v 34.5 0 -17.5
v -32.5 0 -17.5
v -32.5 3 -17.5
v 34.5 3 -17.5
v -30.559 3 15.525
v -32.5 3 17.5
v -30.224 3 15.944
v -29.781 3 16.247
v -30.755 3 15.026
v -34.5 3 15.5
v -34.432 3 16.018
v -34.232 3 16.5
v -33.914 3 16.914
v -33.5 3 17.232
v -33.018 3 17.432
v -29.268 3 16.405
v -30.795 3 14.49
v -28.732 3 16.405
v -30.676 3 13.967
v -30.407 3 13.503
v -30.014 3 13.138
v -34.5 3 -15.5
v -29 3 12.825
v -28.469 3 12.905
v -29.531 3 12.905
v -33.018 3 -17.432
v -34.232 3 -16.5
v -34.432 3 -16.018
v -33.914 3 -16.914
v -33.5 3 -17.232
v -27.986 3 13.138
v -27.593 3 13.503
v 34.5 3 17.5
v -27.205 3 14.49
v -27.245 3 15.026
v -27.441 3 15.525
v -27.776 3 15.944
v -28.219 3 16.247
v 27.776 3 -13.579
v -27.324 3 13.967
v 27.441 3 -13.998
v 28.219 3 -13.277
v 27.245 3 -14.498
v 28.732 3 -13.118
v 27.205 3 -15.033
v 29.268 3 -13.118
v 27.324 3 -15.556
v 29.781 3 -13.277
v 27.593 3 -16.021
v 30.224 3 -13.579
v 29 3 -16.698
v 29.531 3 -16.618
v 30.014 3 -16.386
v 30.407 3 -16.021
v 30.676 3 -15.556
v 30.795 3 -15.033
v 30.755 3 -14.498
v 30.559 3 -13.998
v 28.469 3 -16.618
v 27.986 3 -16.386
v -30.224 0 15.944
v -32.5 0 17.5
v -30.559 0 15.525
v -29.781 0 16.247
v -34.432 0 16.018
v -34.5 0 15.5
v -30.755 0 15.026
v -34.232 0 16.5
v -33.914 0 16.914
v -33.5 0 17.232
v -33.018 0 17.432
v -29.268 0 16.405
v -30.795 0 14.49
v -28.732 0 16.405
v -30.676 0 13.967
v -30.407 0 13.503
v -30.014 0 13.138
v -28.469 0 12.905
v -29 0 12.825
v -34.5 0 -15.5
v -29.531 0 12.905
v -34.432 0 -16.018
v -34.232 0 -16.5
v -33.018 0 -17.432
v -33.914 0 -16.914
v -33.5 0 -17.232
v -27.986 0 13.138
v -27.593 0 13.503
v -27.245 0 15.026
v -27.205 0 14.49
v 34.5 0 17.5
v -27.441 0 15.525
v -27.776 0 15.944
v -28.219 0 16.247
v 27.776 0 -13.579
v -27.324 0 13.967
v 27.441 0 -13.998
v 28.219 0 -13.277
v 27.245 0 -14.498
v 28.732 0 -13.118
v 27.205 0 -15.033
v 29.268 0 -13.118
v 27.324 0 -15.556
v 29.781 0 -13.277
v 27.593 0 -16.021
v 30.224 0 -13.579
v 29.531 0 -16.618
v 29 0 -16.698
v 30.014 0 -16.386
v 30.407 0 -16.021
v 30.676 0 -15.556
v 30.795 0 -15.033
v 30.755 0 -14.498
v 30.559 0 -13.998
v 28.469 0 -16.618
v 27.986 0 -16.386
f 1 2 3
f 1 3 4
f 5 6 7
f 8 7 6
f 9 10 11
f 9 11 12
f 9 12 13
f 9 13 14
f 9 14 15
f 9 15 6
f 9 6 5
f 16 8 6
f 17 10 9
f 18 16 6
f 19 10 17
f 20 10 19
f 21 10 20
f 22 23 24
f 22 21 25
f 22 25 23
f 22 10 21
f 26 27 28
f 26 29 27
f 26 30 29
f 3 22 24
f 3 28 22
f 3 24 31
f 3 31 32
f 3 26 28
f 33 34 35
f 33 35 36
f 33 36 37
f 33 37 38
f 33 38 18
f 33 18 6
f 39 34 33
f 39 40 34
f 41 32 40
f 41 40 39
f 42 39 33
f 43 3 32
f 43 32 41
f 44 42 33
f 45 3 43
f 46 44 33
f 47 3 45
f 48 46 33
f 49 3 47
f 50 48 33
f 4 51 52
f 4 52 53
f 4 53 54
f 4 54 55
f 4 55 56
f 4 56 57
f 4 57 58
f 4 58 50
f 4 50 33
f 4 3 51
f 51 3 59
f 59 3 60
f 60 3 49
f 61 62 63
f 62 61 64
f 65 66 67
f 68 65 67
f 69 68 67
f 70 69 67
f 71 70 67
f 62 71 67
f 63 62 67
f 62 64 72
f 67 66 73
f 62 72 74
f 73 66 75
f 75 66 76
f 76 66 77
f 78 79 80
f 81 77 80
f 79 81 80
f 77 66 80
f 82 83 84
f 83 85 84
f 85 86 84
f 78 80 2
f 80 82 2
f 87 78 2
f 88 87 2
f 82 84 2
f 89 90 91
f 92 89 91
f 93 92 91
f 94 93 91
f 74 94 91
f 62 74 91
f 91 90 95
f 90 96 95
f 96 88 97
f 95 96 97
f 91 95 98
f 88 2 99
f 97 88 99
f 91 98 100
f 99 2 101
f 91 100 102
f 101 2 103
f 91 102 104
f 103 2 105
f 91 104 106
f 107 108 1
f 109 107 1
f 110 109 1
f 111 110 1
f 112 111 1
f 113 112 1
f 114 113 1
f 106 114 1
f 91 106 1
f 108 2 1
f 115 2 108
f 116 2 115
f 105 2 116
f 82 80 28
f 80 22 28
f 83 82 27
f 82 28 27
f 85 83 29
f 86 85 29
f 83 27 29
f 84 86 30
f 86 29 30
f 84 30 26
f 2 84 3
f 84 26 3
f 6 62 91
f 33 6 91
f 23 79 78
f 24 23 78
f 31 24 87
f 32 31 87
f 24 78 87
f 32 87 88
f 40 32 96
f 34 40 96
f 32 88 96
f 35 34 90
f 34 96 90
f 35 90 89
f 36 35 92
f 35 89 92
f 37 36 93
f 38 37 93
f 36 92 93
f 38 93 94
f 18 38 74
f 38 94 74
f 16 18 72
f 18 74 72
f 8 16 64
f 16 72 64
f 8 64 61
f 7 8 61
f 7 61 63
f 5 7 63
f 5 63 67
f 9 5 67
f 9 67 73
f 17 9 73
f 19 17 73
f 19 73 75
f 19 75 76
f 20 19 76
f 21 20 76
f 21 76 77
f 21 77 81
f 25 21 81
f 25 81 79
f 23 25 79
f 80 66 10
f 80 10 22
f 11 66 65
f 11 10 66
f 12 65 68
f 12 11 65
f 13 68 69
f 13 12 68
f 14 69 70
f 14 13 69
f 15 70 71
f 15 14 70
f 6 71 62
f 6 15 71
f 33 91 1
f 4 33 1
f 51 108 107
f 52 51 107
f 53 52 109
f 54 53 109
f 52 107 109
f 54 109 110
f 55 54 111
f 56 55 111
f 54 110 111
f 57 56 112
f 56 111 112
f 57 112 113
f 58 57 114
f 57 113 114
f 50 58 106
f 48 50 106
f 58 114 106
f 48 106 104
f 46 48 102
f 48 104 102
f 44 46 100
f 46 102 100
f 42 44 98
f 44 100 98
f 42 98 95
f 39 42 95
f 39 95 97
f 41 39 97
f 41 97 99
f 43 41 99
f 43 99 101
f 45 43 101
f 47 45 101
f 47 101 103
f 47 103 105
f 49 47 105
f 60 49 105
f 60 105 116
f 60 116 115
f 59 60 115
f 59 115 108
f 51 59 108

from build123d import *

# Parameters (mm, degrees)
SKETCH1_W           = 69
SKETCH1_H           = 35
BOSS_EXTRUDE1_DEPTH = 3
FILLET4_R           = 2
CUT_EXTRUDE1_REACH  = 40.801
SKETCH2_R           = 1.8


with BuildPart() as part:
    # Sketch1 → Boss-Extrude1 (new body)
    with BuildSketch(Plane(origin=(0, 0, 0), x_dir=(1, 0, 0), z_dir=(0, 1, 0))):
        Rectangle(SKETCH1_W, SKETCH1_H)
    extrude(amount=BOSS_EXTRUDE1_DEPTH)

    # Fillet4
    fillet4_edges = [part.edges().sort_by_distance(p)[0] for p in [
        (-34.5, 1.5, 17.5),
        (-34.5, 1.5, -17.5),
    ]]
    fillet(fillet4_edges, radius=FILLET4_R)

    # Sketch2 → Cut-Extrude1 (cut, up to next)
    with BuildSketch(Plane.XZ, mode=Mode.PRIVATE) as cut_extrude1_sk1:
        with Locations(Location((-29, 14.625, 0), (0, 0, 270))):
            Circle(SKETCH2_R)
    cut_extrude1_tool1 = extrude(cut_extrude1_sk1.sketch, amount=-CUT_EXTRUDE1_REACH, mode=Mode.PRIVATE) & part.part
    # Sketch2 → Cut-Extrude1 (cut, up to next)
    with BuildSketch(Plane.XZ, mode=Mode.PRIVATE) as cut_extrude1_sk2:
        with Locations(Location((29, -14.898327821, 0), (0, 0, 270))):
            Circle(SKETCH2_R)
    cut_extrude1_tool2 = extrude(cut_extrude1_sk2.sketch, amount=-CUT_EXTRUDE1_REACH, mode=Mode.PRIVATE) & part.part
    add(cut_extrude1_tool1.solids().sort_by_distance((-29, 0, 14.625))[0], mode=Mode.SUBTRACT)
    add(cut_extrude1_tool2.solids().sort_by_distance((29, 0, -14.898328))[0], mode=Mode.SUBTRACT)


solid = part.part
